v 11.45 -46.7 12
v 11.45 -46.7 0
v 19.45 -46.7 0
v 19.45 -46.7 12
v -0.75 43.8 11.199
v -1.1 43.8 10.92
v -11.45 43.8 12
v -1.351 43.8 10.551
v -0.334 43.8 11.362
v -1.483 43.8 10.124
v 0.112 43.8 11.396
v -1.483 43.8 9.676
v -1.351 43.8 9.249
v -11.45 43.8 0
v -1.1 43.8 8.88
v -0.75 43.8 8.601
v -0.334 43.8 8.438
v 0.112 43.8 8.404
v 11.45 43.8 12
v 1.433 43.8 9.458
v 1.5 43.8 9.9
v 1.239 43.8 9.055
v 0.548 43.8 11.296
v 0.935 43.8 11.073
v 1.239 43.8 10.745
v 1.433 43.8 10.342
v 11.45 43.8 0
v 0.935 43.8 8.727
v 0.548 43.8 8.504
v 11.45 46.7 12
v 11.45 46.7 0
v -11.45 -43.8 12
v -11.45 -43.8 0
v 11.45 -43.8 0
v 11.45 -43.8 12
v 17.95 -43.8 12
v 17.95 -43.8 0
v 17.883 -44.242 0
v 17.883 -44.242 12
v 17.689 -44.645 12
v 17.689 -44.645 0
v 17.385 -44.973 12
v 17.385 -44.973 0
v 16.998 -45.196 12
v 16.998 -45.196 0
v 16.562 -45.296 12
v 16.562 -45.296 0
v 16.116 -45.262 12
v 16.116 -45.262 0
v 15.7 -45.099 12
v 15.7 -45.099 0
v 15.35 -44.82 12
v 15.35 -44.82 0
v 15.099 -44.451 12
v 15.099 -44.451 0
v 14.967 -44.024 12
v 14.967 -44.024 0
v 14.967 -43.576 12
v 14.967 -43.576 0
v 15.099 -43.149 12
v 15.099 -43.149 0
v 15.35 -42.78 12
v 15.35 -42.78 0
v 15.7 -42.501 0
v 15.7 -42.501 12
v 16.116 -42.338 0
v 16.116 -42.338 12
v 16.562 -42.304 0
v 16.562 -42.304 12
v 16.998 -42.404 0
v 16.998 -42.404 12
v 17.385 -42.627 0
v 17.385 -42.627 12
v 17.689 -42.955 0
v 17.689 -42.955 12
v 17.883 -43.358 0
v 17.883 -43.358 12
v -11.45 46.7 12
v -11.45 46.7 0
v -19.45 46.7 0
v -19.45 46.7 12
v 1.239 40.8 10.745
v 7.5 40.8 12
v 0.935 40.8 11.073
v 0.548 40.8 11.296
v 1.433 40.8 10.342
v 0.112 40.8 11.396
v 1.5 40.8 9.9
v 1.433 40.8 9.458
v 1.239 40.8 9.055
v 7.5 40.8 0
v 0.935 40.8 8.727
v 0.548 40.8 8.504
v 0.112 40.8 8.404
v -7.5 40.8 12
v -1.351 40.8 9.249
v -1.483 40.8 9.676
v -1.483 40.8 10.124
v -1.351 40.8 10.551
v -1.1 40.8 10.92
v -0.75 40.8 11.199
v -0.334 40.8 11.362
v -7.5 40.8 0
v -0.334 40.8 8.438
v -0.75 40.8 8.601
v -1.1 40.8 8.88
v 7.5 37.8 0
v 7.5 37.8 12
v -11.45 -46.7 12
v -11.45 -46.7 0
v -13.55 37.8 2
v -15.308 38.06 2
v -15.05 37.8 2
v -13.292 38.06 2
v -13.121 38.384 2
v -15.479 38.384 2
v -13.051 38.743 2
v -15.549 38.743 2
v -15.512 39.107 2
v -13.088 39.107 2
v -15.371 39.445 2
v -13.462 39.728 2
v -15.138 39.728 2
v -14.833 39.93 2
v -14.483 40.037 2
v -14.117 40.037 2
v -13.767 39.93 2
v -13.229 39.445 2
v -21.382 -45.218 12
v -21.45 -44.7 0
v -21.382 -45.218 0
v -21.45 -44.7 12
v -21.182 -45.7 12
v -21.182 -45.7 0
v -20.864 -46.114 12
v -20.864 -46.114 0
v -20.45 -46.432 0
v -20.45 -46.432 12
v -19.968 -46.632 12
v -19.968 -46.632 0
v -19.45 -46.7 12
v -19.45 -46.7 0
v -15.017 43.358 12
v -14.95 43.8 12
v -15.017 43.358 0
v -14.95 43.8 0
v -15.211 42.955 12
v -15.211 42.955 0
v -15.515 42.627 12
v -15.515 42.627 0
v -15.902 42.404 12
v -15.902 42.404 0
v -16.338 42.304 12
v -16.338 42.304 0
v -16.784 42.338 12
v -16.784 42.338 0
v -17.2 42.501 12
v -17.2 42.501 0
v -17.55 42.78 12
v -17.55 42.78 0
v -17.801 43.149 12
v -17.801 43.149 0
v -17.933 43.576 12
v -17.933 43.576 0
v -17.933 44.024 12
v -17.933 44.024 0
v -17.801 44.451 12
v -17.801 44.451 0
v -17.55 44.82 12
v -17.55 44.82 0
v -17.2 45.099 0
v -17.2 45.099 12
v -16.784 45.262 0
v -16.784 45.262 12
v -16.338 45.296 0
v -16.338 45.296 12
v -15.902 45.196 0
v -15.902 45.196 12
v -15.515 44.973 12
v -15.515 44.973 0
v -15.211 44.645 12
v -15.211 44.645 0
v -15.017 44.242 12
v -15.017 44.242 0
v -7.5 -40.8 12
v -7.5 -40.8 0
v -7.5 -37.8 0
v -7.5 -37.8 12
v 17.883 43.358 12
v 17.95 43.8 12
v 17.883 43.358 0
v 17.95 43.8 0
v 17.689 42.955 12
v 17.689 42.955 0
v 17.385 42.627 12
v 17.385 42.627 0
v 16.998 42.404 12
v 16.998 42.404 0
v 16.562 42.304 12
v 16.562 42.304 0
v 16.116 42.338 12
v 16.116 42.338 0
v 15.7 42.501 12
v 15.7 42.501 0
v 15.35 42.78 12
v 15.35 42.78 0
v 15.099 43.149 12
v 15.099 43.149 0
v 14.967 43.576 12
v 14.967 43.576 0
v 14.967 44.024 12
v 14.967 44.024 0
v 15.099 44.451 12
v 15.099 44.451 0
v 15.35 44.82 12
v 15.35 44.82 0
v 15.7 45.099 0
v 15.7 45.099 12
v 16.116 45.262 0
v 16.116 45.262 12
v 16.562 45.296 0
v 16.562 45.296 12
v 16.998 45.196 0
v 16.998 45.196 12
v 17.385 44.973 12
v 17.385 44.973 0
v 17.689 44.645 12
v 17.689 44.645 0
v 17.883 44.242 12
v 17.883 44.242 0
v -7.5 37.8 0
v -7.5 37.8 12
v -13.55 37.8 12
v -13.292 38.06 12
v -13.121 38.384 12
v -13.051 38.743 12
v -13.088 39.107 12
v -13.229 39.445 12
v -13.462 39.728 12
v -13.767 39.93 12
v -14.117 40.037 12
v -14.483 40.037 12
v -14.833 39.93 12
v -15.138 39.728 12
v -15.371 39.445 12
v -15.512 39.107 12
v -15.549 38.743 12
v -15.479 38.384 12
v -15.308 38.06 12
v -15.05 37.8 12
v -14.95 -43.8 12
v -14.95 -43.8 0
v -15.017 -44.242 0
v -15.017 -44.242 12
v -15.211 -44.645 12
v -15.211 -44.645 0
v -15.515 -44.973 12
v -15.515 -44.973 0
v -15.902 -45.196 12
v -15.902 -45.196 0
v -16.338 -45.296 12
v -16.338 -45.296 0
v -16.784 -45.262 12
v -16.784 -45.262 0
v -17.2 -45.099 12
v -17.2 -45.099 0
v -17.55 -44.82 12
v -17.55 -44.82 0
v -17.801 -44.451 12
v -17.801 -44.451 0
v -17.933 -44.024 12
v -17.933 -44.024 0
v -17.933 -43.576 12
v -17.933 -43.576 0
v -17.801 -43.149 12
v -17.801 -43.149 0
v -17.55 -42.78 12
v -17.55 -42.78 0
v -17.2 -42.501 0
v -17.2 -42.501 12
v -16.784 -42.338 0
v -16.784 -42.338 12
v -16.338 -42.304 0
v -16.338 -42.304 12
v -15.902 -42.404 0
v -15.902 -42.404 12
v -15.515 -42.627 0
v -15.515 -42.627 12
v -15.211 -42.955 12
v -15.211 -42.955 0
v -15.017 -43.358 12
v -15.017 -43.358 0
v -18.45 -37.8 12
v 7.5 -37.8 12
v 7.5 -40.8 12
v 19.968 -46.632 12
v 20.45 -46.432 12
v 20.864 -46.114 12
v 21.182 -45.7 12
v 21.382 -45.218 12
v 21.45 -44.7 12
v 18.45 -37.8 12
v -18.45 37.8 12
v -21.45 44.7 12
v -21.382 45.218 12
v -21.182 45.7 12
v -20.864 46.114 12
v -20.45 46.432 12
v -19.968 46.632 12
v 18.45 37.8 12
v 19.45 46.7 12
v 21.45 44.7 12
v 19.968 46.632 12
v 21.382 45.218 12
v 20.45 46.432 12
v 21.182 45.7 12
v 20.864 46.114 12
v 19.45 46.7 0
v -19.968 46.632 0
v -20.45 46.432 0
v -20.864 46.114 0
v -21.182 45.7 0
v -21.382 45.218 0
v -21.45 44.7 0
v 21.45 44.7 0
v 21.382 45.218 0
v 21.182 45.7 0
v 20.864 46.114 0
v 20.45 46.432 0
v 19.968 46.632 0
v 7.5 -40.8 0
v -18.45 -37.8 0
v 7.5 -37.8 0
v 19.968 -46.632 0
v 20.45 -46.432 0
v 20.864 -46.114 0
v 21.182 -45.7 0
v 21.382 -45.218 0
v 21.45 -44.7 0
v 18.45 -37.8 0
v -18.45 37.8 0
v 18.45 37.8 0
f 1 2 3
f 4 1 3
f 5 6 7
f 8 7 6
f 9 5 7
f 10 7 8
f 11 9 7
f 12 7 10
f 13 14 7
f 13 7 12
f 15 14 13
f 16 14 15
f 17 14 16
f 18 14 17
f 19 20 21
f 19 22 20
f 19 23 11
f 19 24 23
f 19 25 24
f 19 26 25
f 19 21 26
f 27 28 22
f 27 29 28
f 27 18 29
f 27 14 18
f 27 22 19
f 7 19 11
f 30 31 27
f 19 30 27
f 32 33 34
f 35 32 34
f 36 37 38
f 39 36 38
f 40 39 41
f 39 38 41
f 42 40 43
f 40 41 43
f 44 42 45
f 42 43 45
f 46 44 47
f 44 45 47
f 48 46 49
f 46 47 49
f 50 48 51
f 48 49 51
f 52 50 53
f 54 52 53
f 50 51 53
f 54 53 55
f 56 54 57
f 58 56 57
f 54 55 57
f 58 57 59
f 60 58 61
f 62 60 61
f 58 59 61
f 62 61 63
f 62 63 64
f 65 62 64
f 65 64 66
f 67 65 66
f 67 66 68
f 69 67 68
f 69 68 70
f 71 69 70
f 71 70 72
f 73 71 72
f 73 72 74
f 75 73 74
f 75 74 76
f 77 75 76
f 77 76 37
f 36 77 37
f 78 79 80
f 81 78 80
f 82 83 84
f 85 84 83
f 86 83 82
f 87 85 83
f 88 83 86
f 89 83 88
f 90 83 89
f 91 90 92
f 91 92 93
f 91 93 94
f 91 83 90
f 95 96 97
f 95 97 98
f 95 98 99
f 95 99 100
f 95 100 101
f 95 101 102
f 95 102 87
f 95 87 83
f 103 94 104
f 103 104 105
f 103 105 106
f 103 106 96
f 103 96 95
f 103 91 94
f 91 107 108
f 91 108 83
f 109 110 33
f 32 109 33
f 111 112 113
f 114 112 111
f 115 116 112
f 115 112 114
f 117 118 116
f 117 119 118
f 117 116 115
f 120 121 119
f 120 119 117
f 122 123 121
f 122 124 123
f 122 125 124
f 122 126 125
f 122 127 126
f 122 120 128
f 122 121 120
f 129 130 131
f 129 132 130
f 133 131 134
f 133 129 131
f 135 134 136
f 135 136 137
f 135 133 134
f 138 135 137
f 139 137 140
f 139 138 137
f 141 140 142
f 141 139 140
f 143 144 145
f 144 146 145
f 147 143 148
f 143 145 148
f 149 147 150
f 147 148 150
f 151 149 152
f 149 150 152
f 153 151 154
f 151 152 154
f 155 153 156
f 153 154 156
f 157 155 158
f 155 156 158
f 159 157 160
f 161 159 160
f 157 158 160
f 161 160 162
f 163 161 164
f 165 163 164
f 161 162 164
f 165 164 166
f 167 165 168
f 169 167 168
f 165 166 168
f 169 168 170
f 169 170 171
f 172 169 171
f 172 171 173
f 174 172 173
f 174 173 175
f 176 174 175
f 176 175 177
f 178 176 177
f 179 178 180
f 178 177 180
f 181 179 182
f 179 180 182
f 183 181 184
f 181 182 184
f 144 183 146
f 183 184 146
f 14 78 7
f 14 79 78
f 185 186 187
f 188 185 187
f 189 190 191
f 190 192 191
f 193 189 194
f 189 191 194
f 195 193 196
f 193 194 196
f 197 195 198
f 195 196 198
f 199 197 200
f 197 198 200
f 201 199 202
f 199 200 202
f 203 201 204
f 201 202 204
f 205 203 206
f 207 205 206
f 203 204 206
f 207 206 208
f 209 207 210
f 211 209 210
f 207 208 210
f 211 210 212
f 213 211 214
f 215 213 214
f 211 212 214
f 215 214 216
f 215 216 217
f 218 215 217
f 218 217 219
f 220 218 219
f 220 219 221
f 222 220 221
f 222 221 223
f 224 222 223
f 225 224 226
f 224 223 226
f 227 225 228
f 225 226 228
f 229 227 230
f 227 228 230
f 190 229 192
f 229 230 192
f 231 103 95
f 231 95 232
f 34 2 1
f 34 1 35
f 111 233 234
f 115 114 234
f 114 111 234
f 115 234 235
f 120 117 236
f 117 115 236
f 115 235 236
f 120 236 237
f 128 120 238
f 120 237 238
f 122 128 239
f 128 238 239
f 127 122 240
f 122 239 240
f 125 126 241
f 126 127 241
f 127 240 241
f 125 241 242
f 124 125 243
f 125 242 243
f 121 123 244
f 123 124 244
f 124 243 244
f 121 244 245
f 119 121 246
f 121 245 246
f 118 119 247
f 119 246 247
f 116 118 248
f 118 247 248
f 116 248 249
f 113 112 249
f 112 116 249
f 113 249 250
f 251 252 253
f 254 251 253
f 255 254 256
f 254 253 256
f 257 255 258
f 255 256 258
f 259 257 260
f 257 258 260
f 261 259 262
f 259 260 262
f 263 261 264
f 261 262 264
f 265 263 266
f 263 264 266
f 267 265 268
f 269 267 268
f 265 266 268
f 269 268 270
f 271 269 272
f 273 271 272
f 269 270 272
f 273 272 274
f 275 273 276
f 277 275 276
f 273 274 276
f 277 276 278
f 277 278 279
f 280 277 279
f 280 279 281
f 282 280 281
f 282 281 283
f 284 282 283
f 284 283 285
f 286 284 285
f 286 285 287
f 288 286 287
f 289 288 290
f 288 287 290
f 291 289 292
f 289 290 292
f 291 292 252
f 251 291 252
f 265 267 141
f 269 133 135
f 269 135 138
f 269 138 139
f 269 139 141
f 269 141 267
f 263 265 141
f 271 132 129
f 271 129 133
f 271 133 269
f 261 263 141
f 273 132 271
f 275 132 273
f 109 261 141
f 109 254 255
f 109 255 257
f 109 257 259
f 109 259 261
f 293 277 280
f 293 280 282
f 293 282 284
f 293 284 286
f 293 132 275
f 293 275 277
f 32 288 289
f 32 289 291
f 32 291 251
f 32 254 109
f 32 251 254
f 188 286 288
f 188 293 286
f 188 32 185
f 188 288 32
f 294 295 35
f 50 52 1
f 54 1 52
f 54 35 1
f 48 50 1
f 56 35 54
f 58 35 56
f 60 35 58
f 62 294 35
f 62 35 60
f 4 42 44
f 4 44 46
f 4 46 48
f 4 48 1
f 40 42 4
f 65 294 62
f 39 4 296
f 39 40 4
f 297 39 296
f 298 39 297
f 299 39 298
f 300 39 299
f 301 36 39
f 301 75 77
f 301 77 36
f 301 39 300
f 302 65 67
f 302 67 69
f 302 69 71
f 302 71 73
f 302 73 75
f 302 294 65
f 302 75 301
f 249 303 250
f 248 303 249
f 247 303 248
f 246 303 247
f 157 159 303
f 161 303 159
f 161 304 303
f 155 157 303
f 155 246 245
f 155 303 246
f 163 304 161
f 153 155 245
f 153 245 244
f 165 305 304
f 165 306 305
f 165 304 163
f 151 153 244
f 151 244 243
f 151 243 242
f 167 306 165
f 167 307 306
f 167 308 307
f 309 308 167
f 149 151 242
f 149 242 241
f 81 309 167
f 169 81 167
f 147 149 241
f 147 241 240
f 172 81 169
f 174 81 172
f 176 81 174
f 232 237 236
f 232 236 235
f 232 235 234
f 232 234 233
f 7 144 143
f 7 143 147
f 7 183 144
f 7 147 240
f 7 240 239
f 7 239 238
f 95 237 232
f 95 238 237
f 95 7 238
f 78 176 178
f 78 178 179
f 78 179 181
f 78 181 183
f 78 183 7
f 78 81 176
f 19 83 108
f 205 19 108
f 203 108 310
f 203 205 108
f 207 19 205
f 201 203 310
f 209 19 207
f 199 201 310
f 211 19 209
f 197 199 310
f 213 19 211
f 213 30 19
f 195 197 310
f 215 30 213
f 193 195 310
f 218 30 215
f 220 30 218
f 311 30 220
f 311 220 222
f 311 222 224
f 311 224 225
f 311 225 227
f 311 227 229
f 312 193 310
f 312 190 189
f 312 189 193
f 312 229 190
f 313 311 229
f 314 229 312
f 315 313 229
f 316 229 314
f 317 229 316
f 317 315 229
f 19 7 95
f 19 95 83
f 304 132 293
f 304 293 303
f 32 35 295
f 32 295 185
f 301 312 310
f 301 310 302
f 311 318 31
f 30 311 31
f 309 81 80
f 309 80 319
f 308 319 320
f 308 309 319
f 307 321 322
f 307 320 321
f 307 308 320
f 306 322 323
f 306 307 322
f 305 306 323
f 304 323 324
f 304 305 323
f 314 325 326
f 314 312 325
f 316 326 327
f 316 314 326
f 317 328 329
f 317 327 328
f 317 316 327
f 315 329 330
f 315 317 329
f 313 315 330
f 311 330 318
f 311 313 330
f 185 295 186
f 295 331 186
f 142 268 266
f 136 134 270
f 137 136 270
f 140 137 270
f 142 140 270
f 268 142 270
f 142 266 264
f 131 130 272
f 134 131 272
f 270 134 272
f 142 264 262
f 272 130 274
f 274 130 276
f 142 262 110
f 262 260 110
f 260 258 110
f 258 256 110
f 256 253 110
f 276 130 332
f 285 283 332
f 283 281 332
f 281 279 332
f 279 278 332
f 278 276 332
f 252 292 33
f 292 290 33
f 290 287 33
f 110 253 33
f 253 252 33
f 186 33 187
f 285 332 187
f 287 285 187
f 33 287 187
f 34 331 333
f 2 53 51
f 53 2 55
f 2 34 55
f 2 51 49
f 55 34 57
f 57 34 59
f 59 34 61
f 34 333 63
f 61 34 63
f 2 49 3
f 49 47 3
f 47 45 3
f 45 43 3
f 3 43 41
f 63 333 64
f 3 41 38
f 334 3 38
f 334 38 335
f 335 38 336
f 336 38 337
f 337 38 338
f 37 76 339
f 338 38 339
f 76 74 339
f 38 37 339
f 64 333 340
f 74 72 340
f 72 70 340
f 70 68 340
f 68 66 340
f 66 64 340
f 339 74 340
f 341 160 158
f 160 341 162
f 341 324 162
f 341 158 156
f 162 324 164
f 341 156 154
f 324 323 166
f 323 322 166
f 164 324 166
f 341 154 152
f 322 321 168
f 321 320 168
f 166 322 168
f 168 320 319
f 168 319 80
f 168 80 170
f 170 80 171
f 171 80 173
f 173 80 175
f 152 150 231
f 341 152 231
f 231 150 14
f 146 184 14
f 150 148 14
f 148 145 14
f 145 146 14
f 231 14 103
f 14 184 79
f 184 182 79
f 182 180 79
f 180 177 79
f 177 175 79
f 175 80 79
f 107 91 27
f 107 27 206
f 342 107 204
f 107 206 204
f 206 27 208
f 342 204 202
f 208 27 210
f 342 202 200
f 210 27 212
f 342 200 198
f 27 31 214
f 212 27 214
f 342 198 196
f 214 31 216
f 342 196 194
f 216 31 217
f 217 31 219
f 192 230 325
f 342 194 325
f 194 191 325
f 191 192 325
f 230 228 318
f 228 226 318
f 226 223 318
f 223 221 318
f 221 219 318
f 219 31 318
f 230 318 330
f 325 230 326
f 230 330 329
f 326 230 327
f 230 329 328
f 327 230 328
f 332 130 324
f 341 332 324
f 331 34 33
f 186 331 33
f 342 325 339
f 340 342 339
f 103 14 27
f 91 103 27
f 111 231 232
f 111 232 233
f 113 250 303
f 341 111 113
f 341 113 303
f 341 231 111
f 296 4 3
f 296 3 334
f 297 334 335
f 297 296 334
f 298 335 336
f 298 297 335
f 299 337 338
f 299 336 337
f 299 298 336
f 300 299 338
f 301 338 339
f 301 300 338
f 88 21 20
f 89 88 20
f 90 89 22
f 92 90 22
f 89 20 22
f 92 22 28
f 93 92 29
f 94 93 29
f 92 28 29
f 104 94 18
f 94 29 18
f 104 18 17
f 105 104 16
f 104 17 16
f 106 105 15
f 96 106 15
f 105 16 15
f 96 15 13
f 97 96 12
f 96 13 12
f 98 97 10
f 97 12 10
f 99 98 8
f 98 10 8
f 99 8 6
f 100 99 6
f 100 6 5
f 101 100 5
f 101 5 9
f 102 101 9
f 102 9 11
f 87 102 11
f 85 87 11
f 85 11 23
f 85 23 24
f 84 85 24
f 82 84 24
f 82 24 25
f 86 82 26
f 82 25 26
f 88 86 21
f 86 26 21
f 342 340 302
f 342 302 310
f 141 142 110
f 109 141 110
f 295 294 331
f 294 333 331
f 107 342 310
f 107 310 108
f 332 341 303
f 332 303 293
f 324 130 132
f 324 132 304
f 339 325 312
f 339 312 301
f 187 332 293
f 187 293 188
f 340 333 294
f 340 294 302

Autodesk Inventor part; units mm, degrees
ref_plane "YZ Plane" through (0, 0, 0) normal (1, 0, 0) x (0, 1, 0)
ref_plane "XZ Plane" through (0, 0, 0) normal (0, 1, 0) x (-1, 0, 0)
ref_plane "XY Plane" through (0, 0, 0) normal (0, 0, 1) x (1, 0, 0)
sketch "Эскиз1" plane through (0, 0, 0) normal (0, 0, 1) x (1, 0, 0)
  line L0 (-18.25, -37.6) -> (18.25, -37.6)
  line L1 (18.25, -37.6) -> (18.25, 37.6)
  line L2 (18.25, 37.6) -> (-18.25, 37.6)
  line L3 (-18.25, 37.6) -> (-18.25, -37.6)
  line L4 (-18.25, 0) -> (18.25, 0) construction
  line L5 (0, 37.6) -> (0, -37.6) construction
  line L6 (-18.45, -37.8) -> (18.45, -37.8)
  line L7 (18.45, -37.8) -> (18.45, 37.8)
  line L8 (18.45, 37.8) -> (-18.45, 37.8)
  line L9 (-18.45, 37.8) -> (-18.45, -37.8)
  line L10 (-7.5, -37.8) -> (7.5, -37.8)
  line L11 (7.5, -37.8) -> (7.5, -40.8)
  line L12 (7.5, -40.8) -> (-7.5, -40.8)
  line L13 (-7.5, -40.8) -> (-7.5, -37.8)
  line L14 (-18.45, -37.8) -> (-18.45, -43.8)
  line L15 (-18.45, -43.8) -> (18.45, -43.8)
  line L16 (18.45, -43.8) -> (18.45, -37.8)
  line L17 (-18.45, 43.8) -> (18.45, 43.8)
  line L18 (-18.45, 37.8) -> (-18.45, 43.8)
  line L19 (18.45, 43.8) -> (18.45, 37.8)
  line L20 (-18.45, -43.8) -> (-21.45, -43.8)
  line L21 (-21.45, -43.8) -> (-21.45, 43.8)
  line L22 (-21.45, 43.8) -> (-18.45, 43.8)
  line L23 (-18.45, 43.8) -> (-18.45, -43.8)
  line L24 (21.45, 43.8) -> (18.45, 43.8)
  line L25 (18.45, 37.8) -> (18.45, 43.8)
  line L26 (18.45, 43.8) -> (18.45, -43.8)
  line L27 (21.45, -43.8) -> (21.45, 43.8)
  line L28 (-7.5, 40.8) -> (-7.5, 37.8)
  line L29 (7.5, 40.8) -> (-7.5, 40.8)
  line L30 (7.5, 37.8) -> (7.5, 40.8)
  line L31 (-21.45, -43.8) -> (-11.45, -43.8)
  line L32 (18.45, -43.8) -> (21.45, -43.8)
  line L33 (21.45, -43.8) -> (11.45, -43.8)
  line L34 (16.45, 46.7) -> (21.45, 46.7)
  line L35 (16.45, 46.7) -> (11.45, 46.7)
  line L36 (11.45, 46.7) -> (11.45, 43.8)
  line L37 (21.45, 46.7) -> (21.45, 43.8)
  line L38 (11.45, 43.8) -> (16.45, 43.8)
  line L39 (-11.45, 46.7) -> (-11.45, 43.8)
  line L40 (-16.45, 46.7) -> (-11.45, 46.7)
  line L41 (-16.45, 46.7) -> (-21.45, 46.7)
  line L42 (-21.45, 46.7) -> (-21.45, 43.8)
  line L43 (-16.45, -46.7) -> (-21.45, -46.7)
  line L44 (-21.45, -46.7) -> (-21.45, -43.8)
  line L45 (-16.45, -46.7) -> (-11.45, -46.7)
  line L46 (-11.45, -46.7) -> (-11.45, -43.8)
  line L47 (11.45, -46.7) -> (11.45, -43.8)
  line L48 (16.45, -46.7) -> (11.45, -46.7)
  line L49 (16.45, -46.7) -> (21.45, -46.7)
  line L50 (21.45, -46.7) -> (21.45, -43.8)
  circle A0 centre (16.45, -43.8) radius 1.5
  circle A1 centre (-16.45, -43.8) radius 1.5
  circle A2 centre (16.45, 43.8) radius 1.5
  circle A3 centre (-16.45, 43.8) radius 1.5
  line L51 (0, 0) -> (-14.3, 0) construction
  line L52 (-14.3, 0) -> (-14.3, 38.8) construction
  line L53 (-14.3, 38.8) -> (0, 38.8) construction
  line L54 (0, 38.8) -> (0, 0) construction
  circle A4 centre (-14.3, 38.8) radius 1.25
  point P0 (-1.9914, -32.8601)
  point P1 (0, -37.8)
  point P2 (-15.05, 37.8)
  point P3 (-13.55, 37.8)
  dimension "d0" = 36.5
  dimension "d1" = 75.2
  dimension "d2" = 36.9
  dimension "d3" = 75.6
  dimension "d4" = 15
  dimension "d5" = 3
  dimension "d6" = 6
  dimension "d7" = 3
  dimension "d8" = 5
  dimension "d10" = 3
  dimension "d11" = 3
  dimension "d12" = 3
  dimension "d13" = 3
  dimension "d19" = 14.3
  dimension "d20" = 38.8
  dimension "d21" = 2.5
extrude "Выдавливание1" add sketch "Эскиз1" along normal blind 12 contours A4 L8 | L8 L18 L17 A3 A2 L19 L30 L29 L28 A4 | L9 L14 L20 L21 L22 L18 | L6 L13 L12 L11 L16 L15 A0 A1 L14 | L22 L42 L41 L40 L39 L17 A3 | L15 A1 L46 L45 L43 L44 L20 | L19 L24 L27 L32 L16 L7 | L17 A2 L36 L35 L34 L37 L24 | L32 L50 L49 L48 L47 L15 A0
fillet "Сопряжение1" radius 2 4 edges at (-21.45, 46.7, 6) (21.45, 46.7, 6) (-21.45, -46.7, 6) (21.45, -46.7, 6)
extrude "Выдавливание3" cut sketch "Эскиз1" against normal blind 10 from surface at 12 contours A4 L8
sketch "Эскиз2" plane through (-11.45, 43.8, 0) normal (0, 1, 0) x (1, 0, 0)
  line L0 (32.9, 0) -> (32.9, -12) construction
  line L1 (32.9, -6) -> (-10, -6) construction
  line L2 (-10, -12) -> (-10, 0) construction
  line L3 (3.95, -12) -> (18.95, -12) construction
  line L4 (11.45, -12) -> (11.45, 0) construction
  line L5 (32.9, -12) -> (30.9, -12) construction
  line L6 (32.9, -12) -> (11.45, -12) construction
  line L7 (11.45, -12) -> (11.45, -9.9) construction
  line L8 (11.45, -9.9) -> (32.9, -9.9) construction
  line L9 (32.9, -9.9) -> (32.9, -12) construction
  circle A0 centre (11.45, -9.9) radius 1.5
  dimension "d24" = 2.1
  dimension "d25" = 3
extrude "Выдавливание4" cut sketch "Эскиз2" against normal blind 3
properties part number "fast_akkum2"
